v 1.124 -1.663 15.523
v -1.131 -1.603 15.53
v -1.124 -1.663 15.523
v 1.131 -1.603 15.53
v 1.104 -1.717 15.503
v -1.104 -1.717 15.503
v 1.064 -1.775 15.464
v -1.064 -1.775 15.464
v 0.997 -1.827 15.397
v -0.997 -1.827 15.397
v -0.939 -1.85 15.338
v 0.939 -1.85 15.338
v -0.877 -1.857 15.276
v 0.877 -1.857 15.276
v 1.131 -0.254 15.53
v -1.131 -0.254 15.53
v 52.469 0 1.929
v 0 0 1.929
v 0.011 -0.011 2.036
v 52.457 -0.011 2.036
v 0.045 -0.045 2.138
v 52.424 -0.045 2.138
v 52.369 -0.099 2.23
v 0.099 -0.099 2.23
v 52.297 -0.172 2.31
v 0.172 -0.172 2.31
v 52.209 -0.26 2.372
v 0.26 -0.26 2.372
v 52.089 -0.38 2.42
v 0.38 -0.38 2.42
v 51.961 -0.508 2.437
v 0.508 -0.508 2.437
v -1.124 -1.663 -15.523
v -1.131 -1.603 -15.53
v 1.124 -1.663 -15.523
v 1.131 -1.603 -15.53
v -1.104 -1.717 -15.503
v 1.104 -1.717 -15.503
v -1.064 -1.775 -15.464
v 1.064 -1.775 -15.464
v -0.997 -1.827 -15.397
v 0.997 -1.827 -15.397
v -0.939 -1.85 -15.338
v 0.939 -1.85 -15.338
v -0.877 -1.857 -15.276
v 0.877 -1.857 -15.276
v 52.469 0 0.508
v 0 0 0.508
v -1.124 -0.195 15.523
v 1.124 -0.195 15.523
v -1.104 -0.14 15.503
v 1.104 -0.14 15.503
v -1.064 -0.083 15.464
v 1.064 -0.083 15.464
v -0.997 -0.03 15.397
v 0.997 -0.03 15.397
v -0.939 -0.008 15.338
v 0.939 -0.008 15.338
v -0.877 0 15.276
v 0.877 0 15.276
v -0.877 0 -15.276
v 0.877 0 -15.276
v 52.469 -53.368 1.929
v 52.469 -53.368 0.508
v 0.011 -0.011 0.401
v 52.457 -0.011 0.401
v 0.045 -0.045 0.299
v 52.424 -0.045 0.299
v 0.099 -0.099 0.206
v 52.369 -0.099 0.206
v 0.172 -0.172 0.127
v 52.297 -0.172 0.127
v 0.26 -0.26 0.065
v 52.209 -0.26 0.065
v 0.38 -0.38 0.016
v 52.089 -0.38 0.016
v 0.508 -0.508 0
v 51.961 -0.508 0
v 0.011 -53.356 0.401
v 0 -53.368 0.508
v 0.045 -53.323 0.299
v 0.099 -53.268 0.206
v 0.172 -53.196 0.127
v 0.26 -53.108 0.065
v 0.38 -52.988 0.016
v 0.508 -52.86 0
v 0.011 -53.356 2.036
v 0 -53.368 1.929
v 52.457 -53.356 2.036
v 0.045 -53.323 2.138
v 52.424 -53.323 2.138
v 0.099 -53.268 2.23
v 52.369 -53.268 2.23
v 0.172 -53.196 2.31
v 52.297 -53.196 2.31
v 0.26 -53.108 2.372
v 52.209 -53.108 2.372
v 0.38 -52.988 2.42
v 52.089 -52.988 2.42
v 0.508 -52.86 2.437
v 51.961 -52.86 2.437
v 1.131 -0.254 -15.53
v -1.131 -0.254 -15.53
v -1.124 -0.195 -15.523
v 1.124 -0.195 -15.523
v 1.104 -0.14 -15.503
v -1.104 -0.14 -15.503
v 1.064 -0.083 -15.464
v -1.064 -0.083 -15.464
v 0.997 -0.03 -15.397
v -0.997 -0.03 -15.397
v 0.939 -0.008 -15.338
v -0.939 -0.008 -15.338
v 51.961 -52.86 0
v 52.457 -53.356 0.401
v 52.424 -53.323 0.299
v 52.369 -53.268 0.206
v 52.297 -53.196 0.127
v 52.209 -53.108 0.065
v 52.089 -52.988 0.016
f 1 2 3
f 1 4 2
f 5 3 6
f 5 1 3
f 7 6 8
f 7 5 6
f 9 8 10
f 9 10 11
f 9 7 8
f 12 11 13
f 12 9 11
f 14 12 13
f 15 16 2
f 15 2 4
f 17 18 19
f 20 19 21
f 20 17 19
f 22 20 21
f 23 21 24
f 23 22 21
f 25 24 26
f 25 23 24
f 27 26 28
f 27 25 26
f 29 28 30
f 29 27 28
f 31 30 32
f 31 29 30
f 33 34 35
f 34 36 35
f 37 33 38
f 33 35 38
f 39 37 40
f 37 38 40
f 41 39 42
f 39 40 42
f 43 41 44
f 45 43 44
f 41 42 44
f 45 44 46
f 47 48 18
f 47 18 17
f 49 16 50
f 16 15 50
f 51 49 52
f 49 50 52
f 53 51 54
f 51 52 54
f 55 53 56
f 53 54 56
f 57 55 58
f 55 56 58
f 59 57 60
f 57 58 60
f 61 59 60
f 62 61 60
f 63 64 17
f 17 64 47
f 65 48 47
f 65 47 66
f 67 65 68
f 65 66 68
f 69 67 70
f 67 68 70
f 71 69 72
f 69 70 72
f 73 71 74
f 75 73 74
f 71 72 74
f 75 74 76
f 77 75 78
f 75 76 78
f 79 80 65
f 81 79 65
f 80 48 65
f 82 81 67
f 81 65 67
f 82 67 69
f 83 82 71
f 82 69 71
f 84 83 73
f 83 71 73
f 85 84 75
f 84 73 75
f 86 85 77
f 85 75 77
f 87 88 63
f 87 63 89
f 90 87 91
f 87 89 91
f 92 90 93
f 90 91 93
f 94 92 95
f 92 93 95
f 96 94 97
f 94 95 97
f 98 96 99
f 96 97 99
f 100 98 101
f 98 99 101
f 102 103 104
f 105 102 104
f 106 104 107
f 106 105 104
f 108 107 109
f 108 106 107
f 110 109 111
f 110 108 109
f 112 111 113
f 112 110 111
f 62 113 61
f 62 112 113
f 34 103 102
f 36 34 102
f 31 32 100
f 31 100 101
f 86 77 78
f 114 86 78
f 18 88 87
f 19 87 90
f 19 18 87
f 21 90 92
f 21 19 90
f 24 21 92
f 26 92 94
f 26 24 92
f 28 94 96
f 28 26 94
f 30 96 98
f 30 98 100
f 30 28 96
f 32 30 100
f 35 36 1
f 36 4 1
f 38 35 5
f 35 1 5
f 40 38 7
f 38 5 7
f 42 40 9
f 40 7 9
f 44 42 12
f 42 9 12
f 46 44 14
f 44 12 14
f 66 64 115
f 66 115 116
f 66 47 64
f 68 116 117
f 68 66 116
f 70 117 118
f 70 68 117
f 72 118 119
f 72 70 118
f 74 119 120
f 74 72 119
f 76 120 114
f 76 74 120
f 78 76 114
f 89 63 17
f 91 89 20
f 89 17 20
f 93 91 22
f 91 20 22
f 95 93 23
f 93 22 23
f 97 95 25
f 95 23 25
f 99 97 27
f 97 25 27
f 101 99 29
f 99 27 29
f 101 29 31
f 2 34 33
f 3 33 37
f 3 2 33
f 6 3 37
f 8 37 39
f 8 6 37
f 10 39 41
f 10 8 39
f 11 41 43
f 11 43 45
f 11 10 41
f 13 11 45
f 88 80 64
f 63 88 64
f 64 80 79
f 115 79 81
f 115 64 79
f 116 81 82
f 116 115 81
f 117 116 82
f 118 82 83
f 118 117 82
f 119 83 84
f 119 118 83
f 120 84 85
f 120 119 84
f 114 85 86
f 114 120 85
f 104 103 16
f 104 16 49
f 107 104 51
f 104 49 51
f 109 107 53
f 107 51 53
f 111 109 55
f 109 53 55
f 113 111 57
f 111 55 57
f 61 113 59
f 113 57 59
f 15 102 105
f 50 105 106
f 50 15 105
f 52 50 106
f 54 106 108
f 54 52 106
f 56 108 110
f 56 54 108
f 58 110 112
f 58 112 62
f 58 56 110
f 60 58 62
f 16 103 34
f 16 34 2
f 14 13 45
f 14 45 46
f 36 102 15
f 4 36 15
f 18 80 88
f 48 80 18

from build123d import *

# Parameters (mm, degrees)
F0_W     = 2.2620111704
F0_H     = 31.0604199767
F1_DEPTH = 1.8574120477
F2_W     = 52.4688437581
F2_H     = 53.3676892519
F3_DEPTH = 2.4366742
F5_R     = 0.508
F6_R     = 0.254


with BuildPart() as f1:
    # F0 (on Front) → F1 (new body)
    with BuildSketch(Plane.XZ):
        with Locations((-75.0106051564, -91.7925722897)):
            Rectangle(F0_W, F0_H)
    extrude(amount=F1_DEPTH)


with BuildPart() as f1b:
    # F0 (on Front) → F1, piece 2 (new body)
    with BuildSketch(Plane.XZ):
        Rectangle(F0_W, F0_H)
    extrude(amount=F1_DEPTH)

    # F6
    f6_edges = [f1b.edges().sort_by_distance(p)[0] for p in [
        (1.131006, -1.857412, 0),
        (0, -1.857412, 15.53021),
        (-1.131006, -1.857412, 0),
        (0, -1.857412, -15.53021),
        (1.131006, 0, 0),
        (0, 0, 15.53021),
        (-1.131006, 0, 0),
        (0, 0, -15.53021),
    ]]
    fillet(f6_edges, radius=F6_R)


with BuildPart() as f3:
    # F2 (on Top) → F3 (new body)
    with BuildSketch(Plane.XY):
        with Locations((26.2344218791, -26.6838446259)):
            Rectangle(F2_W, F2_H)
    extrude(amount=F3_DEPTH)

    # F5
    f5_edges = [f3.edges().sort_by_distance(p)[0] for p in [
        (26.234422, 0, 2.436674),
        (0, -26.683845, 2.436674),
        (26.234422, -53.367689, 2.436674),
        (52.468844, -26.683845, 2.436674),
        (26.234422, 0, 0),
        (0, -26.683845, 0),
        (26.234422, -53.367689, 0),
        (52.468844, -26.683845, 0),
    ]]
    fillet(f5_edges, radius=F5_R)


solid = Compound([f1b.part, f3.part])
